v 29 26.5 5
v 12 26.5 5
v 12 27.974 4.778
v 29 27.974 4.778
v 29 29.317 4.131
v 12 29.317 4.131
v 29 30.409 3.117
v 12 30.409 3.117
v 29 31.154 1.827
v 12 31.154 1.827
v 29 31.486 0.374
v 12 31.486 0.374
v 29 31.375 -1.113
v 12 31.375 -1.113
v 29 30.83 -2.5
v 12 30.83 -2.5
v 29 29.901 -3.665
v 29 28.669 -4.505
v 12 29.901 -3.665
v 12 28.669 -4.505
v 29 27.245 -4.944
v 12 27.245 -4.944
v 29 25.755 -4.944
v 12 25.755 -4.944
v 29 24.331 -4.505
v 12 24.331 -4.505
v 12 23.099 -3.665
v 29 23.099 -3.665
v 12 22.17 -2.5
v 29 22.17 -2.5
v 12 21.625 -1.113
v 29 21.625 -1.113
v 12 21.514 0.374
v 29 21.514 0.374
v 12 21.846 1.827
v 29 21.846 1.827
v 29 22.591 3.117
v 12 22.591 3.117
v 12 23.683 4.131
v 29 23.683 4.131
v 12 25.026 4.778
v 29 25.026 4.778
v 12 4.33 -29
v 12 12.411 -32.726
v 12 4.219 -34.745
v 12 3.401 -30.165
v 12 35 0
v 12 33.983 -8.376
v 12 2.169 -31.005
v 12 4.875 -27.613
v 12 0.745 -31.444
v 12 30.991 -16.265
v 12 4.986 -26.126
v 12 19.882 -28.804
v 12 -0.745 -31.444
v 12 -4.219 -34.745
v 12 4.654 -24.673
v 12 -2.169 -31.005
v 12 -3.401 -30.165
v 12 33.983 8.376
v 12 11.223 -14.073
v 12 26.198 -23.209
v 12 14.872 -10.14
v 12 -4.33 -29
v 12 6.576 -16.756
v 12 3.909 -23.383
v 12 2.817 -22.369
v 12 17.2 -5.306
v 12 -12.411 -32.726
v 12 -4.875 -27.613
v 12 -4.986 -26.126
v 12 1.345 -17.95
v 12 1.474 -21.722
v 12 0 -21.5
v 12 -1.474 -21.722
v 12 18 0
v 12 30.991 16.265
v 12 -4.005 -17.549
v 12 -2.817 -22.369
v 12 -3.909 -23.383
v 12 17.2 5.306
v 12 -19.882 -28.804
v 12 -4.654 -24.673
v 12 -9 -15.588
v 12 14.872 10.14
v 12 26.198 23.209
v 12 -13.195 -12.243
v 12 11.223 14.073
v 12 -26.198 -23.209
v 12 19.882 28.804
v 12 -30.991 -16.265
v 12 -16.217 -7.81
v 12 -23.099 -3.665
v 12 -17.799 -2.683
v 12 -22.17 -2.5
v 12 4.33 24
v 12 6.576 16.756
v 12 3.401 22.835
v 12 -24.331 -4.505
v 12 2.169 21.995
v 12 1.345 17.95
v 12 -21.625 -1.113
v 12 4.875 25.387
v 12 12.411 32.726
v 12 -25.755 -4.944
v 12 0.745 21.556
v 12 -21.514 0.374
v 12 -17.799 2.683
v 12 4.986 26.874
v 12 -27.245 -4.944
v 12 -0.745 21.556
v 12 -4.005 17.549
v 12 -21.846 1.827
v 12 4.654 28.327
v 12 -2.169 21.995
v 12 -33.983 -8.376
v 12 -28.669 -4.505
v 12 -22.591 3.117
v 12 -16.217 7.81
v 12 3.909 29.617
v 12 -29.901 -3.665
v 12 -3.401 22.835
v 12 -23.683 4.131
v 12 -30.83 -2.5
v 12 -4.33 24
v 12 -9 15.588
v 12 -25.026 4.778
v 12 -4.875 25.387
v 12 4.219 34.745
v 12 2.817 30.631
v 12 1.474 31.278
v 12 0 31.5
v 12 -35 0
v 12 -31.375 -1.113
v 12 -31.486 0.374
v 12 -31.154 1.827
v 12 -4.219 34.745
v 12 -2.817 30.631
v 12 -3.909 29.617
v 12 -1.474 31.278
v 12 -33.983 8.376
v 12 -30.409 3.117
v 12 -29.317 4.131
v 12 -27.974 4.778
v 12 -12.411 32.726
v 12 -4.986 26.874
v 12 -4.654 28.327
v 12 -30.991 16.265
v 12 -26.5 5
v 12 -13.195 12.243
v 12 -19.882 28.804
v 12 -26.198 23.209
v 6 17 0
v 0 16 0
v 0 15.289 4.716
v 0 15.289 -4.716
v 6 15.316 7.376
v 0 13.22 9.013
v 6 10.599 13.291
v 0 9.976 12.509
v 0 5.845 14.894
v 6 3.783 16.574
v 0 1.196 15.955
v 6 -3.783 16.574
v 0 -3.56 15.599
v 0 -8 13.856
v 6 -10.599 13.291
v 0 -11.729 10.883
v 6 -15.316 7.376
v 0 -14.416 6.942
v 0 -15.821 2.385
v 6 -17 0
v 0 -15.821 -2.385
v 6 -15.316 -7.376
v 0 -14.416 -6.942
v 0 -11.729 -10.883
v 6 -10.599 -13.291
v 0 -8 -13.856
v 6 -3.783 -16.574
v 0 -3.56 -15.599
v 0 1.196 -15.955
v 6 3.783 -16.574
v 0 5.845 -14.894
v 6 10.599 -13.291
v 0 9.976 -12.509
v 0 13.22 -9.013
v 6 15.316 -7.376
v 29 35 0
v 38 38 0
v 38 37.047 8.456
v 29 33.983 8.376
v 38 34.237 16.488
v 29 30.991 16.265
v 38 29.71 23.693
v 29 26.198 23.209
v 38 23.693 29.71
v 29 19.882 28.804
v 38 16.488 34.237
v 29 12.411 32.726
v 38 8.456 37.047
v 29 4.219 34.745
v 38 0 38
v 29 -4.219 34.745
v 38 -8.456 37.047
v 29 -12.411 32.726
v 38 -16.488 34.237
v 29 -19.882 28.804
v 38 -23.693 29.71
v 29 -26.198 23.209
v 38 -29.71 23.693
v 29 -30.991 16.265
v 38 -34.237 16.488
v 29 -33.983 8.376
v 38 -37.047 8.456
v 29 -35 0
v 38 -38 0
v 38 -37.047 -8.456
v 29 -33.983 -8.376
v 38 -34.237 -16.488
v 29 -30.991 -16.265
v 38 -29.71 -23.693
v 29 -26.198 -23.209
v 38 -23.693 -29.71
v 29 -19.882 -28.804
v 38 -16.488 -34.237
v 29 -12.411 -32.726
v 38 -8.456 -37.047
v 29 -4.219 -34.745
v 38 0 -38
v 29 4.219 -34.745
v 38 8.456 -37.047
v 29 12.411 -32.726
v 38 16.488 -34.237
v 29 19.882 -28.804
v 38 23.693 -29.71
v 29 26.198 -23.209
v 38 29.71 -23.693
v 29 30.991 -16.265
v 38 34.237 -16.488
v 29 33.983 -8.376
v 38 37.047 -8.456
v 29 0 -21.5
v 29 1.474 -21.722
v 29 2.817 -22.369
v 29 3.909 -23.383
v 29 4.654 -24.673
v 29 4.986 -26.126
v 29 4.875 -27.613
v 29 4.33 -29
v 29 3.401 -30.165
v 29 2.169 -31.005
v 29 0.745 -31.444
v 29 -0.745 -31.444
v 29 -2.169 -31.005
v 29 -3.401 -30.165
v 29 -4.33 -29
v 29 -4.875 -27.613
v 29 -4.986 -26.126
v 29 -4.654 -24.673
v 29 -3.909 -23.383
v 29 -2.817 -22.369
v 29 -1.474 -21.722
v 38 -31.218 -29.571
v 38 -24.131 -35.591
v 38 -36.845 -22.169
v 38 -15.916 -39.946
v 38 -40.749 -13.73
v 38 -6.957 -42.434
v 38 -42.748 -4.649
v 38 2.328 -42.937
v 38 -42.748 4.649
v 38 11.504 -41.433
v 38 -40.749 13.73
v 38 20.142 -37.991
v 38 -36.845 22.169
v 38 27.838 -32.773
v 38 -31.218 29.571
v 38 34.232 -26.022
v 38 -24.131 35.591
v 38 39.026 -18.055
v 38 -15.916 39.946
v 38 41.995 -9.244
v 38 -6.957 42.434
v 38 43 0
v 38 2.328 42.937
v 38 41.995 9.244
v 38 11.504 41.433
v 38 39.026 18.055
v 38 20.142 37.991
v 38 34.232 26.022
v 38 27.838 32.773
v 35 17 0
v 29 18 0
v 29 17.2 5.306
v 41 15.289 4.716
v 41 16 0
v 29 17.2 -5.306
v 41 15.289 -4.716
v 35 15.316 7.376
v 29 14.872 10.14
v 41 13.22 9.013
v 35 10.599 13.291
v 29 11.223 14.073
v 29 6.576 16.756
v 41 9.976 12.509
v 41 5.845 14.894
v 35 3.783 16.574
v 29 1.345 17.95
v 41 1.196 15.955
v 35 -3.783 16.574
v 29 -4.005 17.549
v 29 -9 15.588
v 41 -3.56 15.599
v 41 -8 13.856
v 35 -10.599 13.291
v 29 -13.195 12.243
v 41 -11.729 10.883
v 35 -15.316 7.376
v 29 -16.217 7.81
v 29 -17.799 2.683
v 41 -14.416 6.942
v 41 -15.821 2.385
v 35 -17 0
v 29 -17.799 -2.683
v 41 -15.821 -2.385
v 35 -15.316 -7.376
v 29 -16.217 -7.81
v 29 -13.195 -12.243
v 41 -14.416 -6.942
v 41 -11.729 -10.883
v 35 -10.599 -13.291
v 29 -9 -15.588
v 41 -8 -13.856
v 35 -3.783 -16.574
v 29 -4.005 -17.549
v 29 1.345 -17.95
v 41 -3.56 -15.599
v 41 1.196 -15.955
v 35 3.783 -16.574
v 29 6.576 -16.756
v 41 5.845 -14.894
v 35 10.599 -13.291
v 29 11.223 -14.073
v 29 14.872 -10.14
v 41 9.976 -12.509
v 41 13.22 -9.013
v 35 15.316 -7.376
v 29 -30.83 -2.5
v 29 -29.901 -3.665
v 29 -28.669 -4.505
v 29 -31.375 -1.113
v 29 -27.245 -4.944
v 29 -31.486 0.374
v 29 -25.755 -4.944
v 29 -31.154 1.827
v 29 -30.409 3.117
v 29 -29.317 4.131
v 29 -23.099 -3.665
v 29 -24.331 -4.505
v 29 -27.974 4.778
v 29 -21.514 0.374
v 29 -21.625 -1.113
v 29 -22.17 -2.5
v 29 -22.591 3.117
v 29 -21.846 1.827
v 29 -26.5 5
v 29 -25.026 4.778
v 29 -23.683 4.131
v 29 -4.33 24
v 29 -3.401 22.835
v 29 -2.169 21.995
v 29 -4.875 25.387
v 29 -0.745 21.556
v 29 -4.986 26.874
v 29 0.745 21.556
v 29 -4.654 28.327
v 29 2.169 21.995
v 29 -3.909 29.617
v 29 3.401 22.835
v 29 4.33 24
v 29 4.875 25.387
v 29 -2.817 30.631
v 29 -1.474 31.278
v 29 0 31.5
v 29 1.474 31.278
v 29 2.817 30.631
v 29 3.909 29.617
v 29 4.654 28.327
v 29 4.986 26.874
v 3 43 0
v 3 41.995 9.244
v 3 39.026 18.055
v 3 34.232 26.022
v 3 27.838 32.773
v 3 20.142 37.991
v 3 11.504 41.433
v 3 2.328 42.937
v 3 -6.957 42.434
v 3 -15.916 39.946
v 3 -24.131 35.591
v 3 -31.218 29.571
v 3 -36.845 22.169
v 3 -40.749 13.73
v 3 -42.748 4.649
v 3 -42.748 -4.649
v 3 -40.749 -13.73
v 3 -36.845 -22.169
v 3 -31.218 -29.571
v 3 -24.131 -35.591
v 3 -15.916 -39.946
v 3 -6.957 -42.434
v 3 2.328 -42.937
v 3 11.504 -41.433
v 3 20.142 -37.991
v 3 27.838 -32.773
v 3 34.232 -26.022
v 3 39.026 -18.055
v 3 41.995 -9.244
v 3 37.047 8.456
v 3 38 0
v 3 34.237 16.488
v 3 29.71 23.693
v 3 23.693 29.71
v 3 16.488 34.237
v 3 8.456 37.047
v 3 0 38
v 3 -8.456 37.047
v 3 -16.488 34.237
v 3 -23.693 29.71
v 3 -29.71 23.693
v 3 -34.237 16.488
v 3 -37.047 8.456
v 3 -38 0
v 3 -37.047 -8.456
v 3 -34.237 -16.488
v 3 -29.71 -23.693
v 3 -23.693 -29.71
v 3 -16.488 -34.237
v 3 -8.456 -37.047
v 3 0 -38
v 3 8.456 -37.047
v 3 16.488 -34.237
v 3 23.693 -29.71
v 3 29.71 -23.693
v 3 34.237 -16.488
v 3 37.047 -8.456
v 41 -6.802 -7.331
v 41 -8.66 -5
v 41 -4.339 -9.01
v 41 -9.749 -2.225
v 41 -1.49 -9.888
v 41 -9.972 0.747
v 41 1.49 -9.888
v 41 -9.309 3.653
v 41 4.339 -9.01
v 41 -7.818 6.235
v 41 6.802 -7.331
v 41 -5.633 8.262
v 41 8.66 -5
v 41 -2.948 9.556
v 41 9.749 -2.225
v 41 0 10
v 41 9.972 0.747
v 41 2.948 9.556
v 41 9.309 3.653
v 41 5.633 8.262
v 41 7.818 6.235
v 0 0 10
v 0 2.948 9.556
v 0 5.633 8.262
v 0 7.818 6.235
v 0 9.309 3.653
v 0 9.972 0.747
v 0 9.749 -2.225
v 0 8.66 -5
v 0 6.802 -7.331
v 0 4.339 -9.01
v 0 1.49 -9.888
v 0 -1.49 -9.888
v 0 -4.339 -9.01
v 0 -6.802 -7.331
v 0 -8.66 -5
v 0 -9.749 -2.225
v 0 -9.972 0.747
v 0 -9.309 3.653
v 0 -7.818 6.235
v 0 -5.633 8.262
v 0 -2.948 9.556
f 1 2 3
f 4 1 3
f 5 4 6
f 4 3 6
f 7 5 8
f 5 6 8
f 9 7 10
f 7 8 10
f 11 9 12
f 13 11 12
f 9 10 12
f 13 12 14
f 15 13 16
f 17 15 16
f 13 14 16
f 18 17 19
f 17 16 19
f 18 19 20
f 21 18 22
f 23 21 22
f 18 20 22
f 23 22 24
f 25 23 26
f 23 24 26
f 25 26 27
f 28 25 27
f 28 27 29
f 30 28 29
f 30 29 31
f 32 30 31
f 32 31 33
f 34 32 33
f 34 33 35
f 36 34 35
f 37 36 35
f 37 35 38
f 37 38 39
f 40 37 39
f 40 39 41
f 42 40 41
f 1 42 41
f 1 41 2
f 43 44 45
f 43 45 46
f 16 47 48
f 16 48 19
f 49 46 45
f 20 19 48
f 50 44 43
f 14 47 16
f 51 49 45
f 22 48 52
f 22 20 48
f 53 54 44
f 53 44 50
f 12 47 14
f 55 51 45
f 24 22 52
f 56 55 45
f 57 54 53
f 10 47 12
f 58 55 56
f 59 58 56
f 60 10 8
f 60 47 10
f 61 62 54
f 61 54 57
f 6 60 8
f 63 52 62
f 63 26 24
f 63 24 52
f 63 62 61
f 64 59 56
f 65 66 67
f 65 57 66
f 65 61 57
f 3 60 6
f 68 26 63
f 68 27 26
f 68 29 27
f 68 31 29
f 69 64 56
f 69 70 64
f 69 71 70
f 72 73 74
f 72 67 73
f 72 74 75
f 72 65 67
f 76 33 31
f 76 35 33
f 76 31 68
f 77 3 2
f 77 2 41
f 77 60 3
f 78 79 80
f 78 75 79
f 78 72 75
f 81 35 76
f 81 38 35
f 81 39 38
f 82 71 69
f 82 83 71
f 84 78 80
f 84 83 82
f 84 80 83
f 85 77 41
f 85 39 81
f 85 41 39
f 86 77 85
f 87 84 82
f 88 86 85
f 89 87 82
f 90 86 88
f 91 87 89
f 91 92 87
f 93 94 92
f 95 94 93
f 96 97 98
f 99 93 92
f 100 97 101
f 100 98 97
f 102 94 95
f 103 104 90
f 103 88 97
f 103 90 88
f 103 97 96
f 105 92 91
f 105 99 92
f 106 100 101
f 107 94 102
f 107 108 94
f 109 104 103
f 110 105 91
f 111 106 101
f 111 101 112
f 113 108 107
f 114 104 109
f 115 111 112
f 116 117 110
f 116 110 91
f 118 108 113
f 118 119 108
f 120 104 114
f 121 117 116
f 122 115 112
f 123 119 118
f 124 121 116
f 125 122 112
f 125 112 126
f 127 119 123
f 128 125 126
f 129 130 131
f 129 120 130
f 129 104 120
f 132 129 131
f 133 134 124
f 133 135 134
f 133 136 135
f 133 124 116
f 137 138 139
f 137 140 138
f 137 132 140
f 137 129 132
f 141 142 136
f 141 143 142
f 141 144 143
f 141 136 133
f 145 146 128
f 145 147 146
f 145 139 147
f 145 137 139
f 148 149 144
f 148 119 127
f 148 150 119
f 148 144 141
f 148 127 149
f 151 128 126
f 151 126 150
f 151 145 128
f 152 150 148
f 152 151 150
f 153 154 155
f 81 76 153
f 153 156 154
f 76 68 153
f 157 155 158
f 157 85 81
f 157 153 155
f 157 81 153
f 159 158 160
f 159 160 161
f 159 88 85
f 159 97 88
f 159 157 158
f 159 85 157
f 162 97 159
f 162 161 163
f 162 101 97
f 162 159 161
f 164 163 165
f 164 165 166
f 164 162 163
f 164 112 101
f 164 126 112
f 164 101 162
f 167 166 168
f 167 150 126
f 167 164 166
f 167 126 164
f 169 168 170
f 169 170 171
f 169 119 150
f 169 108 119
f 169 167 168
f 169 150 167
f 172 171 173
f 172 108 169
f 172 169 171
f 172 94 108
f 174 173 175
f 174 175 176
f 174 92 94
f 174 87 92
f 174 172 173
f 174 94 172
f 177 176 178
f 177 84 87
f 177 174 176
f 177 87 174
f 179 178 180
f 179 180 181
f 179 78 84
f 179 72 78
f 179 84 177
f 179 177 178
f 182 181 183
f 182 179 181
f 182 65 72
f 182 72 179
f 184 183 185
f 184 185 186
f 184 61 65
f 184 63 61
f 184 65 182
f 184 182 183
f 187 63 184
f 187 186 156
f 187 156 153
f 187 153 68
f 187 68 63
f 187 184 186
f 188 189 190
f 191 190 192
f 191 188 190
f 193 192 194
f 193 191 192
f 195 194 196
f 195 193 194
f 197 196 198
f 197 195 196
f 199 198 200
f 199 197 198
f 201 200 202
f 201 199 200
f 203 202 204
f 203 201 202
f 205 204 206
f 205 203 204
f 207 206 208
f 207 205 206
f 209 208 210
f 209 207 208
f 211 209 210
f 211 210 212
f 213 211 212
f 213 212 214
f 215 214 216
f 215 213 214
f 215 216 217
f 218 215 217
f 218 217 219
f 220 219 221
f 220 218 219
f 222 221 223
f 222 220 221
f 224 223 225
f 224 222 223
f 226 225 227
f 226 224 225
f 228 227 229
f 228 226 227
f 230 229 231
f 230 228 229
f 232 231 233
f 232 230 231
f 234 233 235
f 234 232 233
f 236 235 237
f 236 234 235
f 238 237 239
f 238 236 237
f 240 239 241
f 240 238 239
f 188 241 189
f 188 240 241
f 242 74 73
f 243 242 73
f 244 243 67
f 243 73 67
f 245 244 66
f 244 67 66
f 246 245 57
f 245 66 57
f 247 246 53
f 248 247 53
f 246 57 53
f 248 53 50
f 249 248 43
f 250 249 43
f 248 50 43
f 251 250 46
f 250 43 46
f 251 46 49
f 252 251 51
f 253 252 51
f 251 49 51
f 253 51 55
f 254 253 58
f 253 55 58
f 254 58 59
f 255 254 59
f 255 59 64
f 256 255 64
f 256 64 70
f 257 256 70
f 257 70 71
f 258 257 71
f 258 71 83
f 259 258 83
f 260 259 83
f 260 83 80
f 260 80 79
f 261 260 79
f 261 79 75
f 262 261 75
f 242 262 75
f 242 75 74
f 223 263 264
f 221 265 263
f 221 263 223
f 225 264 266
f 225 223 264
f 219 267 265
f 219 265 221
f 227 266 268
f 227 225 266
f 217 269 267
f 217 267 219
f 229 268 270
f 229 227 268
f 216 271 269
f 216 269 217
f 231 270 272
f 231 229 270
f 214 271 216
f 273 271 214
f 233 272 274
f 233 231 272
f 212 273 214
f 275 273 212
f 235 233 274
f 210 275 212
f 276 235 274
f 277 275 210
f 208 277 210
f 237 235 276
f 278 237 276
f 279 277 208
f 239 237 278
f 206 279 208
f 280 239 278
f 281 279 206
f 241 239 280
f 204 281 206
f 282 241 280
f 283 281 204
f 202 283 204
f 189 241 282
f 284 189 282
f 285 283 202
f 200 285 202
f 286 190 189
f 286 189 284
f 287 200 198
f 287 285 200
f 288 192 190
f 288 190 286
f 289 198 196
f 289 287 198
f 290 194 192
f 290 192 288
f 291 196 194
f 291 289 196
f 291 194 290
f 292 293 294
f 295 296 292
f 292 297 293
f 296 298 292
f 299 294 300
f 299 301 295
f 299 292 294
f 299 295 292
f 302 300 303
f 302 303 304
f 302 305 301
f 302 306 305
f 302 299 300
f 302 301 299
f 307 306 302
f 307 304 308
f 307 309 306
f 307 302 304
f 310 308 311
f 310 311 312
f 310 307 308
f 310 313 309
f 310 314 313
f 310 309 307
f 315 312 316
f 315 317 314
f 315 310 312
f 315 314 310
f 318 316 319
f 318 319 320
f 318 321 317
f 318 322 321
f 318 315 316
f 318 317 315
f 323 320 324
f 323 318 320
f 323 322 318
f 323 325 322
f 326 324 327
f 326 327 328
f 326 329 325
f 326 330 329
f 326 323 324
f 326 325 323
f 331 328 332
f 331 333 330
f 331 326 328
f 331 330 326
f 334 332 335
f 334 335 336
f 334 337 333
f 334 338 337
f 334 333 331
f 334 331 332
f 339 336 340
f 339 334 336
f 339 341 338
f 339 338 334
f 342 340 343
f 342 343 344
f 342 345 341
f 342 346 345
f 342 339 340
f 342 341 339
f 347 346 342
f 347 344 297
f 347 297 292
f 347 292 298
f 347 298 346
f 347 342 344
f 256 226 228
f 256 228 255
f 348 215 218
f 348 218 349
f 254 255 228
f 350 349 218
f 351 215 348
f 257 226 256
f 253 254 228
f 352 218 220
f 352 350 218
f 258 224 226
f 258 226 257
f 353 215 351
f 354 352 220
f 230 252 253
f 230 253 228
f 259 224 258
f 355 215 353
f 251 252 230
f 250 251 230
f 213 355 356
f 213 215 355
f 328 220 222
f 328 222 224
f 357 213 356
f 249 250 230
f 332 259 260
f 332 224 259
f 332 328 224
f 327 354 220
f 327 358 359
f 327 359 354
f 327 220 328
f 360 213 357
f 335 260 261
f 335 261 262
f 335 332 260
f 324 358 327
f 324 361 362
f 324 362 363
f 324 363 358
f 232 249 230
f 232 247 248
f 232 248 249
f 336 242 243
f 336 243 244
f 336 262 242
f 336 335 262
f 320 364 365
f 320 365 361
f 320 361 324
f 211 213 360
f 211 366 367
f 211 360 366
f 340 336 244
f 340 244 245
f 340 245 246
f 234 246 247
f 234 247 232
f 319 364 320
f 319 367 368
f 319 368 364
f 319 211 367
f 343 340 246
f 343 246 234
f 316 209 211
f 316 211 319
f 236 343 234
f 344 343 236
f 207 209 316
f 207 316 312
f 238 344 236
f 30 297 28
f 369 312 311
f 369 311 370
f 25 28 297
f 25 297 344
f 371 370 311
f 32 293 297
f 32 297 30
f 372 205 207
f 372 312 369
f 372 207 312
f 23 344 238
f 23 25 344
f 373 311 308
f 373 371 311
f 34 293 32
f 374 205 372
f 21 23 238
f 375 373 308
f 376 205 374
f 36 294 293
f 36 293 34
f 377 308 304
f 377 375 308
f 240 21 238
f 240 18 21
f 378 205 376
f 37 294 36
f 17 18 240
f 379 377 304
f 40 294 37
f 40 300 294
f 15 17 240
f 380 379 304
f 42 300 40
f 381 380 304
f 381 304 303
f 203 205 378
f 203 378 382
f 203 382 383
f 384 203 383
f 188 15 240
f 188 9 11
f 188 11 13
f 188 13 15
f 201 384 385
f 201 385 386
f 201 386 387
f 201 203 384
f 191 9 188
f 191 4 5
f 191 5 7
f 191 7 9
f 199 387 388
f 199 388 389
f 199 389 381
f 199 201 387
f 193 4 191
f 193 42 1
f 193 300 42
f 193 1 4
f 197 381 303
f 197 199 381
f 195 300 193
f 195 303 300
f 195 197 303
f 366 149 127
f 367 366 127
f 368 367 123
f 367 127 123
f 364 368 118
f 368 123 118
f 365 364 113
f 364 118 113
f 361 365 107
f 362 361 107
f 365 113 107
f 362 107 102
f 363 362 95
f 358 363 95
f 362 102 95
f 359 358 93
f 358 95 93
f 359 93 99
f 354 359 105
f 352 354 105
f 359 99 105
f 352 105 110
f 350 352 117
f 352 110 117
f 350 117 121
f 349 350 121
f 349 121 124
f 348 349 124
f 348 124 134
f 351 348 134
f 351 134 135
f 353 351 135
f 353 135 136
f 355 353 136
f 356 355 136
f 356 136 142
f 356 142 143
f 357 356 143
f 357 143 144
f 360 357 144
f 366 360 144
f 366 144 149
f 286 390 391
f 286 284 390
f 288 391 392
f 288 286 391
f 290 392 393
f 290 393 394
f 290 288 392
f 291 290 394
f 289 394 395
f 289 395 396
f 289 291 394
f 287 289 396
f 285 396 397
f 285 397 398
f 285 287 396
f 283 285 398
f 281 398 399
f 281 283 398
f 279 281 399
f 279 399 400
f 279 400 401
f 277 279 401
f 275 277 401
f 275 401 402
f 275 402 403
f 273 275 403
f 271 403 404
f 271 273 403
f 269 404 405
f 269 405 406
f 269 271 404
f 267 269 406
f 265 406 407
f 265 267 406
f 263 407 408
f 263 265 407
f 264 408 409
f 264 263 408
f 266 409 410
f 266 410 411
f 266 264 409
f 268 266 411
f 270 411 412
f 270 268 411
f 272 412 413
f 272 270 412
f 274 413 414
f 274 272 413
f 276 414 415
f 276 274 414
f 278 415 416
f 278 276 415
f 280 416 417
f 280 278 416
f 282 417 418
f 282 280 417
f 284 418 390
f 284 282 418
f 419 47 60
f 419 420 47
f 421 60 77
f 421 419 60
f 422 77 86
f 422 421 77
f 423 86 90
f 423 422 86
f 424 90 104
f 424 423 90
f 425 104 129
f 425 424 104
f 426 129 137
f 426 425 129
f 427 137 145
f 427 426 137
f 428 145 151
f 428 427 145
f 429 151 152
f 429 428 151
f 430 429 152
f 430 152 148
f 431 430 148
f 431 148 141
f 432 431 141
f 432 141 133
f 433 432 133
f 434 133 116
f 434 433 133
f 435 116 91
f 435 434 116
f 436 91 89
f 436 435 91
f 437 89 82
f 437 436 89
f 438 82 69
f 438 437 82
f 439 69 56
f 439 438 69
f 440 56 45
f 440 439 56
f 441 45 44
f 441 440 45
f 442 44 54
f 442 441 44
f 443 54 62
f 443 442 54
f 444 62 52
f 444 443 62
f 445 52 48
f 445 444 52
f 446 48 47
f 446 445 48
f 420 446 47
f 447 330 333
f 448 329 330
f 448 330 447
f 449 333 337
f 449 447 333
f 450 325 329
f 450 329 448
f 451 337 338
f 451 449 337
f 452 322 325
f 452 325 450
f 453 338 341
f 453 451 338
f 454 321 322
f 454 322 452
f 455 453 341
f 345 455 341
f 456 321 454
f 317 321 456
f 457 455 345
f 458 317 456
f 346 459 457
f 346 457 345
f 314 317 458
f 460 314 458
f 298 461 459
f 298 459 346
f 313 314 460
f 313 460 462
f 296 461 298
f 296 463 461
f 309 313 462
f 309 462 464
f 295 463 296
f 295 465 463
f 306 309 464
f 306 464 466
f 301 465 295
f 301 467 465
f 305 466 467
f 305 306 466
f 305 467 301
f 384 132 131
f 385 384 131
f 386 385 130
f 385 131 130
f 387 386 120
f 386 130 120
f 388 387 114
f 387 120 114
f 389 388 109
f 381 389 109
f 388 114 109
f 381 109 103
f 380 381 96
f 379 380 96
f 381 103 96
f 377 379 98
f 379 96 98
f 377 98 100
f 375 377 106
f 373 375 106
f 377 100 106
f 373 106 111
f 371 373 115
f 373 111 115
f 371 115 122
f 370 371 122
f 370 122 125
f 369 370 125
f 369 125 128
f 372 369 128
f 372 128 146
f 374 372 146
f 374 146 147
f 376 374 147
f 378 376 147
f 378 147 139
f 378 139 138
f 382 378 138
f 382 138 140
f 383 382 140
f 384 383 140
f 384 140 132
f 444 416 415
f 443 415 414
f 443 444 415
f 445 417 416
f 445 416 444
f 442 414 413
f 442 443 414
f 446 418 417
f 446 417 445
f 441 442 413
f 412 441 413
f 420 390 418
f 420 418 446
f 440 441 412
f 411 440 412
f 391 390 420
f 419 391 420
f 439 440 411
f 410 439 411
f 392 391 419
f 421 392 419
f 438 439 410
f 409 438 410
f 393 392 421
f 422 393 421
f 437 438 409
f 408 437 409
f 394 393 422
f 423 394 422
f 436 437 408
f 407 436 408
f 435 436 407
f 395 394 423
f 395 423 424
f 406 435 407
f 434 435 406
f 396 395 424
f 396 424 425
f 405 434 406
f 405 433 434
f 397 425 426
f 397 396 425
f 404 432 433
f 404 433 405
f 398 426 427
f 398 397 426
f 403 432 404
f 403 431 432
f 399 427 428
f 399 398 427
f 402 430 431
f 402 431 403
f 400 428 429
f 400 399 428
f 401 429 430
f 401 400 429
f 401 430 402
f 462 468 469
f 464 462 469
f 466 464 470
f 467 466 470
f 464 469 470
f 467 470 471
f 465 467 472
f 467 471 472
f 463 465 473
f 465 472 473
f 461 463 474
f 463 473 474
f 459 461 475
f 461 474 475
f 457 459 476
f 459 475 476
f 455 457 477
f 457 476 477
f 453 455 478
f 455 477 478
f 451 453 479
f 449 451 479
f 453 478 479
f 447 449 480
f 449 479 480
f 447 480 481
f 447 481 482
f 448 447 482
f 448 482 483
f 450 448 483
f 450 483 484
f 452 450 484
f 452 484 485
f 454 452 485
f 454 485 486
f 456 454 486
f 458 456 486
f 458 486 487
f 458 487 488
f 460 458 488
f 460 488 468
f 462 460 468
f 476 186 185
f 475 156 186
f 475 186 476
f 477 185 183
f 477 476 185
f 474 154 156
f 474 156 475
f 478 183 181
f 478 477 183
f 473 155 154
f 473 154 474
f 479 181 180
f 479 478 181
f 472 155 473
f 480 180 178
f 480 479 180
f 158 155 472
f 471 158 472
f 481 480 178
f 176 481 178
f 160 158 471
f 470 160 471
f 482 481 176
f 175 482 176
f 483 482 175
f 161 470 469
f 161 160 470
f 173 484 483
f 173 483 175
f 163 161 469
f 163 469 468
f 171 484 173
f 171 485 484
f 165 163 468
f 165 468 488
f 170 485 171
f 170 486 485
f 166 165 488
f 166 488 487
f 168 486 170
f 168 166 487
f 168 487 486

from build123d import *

# Parameters (mm, degrees)
SKETCH2_R          = 10
SKETCH2_R_2        = 5
CUT_EXTRUDE1_DEPTH = 42


with BuildPart() as part:
    # Sketch1 → Revolve1 (revolve)
    with BuildSketch(Plane.XY):
        Polygon((0, 0), (0, 16), (12, 18), (12, 35), (3, 38), (3, 43), (38, 43), (38, 38), (29, 35), (29, 18), (41, 16), (41, 0), align=None)
    revolve(axis=Axis((0, 0, 0), (1, 0, 0)))

    # Sketch2 → Cut-Extrude1 (cut, through all)
    with BuildSketch(Plane.ZY):
        Circle(SKETCH2_R)
        with Locations((0, 26.5)):
            Circle(SKETCH2_R_2)
        with Locations((26.5, 0)):
            Circle(SKETCH2_R_2)
        with Locations((0, -26.5)):
            Circle(SKETCH2_R_2)
        with Locations((-26.5, 0)):
            Circle(SKETCH2_R_2)
    extrude(amount=-CUT_EXTRUDE1_DEPTH, mode=Mode.SUBTRACT)


solid = part.part
